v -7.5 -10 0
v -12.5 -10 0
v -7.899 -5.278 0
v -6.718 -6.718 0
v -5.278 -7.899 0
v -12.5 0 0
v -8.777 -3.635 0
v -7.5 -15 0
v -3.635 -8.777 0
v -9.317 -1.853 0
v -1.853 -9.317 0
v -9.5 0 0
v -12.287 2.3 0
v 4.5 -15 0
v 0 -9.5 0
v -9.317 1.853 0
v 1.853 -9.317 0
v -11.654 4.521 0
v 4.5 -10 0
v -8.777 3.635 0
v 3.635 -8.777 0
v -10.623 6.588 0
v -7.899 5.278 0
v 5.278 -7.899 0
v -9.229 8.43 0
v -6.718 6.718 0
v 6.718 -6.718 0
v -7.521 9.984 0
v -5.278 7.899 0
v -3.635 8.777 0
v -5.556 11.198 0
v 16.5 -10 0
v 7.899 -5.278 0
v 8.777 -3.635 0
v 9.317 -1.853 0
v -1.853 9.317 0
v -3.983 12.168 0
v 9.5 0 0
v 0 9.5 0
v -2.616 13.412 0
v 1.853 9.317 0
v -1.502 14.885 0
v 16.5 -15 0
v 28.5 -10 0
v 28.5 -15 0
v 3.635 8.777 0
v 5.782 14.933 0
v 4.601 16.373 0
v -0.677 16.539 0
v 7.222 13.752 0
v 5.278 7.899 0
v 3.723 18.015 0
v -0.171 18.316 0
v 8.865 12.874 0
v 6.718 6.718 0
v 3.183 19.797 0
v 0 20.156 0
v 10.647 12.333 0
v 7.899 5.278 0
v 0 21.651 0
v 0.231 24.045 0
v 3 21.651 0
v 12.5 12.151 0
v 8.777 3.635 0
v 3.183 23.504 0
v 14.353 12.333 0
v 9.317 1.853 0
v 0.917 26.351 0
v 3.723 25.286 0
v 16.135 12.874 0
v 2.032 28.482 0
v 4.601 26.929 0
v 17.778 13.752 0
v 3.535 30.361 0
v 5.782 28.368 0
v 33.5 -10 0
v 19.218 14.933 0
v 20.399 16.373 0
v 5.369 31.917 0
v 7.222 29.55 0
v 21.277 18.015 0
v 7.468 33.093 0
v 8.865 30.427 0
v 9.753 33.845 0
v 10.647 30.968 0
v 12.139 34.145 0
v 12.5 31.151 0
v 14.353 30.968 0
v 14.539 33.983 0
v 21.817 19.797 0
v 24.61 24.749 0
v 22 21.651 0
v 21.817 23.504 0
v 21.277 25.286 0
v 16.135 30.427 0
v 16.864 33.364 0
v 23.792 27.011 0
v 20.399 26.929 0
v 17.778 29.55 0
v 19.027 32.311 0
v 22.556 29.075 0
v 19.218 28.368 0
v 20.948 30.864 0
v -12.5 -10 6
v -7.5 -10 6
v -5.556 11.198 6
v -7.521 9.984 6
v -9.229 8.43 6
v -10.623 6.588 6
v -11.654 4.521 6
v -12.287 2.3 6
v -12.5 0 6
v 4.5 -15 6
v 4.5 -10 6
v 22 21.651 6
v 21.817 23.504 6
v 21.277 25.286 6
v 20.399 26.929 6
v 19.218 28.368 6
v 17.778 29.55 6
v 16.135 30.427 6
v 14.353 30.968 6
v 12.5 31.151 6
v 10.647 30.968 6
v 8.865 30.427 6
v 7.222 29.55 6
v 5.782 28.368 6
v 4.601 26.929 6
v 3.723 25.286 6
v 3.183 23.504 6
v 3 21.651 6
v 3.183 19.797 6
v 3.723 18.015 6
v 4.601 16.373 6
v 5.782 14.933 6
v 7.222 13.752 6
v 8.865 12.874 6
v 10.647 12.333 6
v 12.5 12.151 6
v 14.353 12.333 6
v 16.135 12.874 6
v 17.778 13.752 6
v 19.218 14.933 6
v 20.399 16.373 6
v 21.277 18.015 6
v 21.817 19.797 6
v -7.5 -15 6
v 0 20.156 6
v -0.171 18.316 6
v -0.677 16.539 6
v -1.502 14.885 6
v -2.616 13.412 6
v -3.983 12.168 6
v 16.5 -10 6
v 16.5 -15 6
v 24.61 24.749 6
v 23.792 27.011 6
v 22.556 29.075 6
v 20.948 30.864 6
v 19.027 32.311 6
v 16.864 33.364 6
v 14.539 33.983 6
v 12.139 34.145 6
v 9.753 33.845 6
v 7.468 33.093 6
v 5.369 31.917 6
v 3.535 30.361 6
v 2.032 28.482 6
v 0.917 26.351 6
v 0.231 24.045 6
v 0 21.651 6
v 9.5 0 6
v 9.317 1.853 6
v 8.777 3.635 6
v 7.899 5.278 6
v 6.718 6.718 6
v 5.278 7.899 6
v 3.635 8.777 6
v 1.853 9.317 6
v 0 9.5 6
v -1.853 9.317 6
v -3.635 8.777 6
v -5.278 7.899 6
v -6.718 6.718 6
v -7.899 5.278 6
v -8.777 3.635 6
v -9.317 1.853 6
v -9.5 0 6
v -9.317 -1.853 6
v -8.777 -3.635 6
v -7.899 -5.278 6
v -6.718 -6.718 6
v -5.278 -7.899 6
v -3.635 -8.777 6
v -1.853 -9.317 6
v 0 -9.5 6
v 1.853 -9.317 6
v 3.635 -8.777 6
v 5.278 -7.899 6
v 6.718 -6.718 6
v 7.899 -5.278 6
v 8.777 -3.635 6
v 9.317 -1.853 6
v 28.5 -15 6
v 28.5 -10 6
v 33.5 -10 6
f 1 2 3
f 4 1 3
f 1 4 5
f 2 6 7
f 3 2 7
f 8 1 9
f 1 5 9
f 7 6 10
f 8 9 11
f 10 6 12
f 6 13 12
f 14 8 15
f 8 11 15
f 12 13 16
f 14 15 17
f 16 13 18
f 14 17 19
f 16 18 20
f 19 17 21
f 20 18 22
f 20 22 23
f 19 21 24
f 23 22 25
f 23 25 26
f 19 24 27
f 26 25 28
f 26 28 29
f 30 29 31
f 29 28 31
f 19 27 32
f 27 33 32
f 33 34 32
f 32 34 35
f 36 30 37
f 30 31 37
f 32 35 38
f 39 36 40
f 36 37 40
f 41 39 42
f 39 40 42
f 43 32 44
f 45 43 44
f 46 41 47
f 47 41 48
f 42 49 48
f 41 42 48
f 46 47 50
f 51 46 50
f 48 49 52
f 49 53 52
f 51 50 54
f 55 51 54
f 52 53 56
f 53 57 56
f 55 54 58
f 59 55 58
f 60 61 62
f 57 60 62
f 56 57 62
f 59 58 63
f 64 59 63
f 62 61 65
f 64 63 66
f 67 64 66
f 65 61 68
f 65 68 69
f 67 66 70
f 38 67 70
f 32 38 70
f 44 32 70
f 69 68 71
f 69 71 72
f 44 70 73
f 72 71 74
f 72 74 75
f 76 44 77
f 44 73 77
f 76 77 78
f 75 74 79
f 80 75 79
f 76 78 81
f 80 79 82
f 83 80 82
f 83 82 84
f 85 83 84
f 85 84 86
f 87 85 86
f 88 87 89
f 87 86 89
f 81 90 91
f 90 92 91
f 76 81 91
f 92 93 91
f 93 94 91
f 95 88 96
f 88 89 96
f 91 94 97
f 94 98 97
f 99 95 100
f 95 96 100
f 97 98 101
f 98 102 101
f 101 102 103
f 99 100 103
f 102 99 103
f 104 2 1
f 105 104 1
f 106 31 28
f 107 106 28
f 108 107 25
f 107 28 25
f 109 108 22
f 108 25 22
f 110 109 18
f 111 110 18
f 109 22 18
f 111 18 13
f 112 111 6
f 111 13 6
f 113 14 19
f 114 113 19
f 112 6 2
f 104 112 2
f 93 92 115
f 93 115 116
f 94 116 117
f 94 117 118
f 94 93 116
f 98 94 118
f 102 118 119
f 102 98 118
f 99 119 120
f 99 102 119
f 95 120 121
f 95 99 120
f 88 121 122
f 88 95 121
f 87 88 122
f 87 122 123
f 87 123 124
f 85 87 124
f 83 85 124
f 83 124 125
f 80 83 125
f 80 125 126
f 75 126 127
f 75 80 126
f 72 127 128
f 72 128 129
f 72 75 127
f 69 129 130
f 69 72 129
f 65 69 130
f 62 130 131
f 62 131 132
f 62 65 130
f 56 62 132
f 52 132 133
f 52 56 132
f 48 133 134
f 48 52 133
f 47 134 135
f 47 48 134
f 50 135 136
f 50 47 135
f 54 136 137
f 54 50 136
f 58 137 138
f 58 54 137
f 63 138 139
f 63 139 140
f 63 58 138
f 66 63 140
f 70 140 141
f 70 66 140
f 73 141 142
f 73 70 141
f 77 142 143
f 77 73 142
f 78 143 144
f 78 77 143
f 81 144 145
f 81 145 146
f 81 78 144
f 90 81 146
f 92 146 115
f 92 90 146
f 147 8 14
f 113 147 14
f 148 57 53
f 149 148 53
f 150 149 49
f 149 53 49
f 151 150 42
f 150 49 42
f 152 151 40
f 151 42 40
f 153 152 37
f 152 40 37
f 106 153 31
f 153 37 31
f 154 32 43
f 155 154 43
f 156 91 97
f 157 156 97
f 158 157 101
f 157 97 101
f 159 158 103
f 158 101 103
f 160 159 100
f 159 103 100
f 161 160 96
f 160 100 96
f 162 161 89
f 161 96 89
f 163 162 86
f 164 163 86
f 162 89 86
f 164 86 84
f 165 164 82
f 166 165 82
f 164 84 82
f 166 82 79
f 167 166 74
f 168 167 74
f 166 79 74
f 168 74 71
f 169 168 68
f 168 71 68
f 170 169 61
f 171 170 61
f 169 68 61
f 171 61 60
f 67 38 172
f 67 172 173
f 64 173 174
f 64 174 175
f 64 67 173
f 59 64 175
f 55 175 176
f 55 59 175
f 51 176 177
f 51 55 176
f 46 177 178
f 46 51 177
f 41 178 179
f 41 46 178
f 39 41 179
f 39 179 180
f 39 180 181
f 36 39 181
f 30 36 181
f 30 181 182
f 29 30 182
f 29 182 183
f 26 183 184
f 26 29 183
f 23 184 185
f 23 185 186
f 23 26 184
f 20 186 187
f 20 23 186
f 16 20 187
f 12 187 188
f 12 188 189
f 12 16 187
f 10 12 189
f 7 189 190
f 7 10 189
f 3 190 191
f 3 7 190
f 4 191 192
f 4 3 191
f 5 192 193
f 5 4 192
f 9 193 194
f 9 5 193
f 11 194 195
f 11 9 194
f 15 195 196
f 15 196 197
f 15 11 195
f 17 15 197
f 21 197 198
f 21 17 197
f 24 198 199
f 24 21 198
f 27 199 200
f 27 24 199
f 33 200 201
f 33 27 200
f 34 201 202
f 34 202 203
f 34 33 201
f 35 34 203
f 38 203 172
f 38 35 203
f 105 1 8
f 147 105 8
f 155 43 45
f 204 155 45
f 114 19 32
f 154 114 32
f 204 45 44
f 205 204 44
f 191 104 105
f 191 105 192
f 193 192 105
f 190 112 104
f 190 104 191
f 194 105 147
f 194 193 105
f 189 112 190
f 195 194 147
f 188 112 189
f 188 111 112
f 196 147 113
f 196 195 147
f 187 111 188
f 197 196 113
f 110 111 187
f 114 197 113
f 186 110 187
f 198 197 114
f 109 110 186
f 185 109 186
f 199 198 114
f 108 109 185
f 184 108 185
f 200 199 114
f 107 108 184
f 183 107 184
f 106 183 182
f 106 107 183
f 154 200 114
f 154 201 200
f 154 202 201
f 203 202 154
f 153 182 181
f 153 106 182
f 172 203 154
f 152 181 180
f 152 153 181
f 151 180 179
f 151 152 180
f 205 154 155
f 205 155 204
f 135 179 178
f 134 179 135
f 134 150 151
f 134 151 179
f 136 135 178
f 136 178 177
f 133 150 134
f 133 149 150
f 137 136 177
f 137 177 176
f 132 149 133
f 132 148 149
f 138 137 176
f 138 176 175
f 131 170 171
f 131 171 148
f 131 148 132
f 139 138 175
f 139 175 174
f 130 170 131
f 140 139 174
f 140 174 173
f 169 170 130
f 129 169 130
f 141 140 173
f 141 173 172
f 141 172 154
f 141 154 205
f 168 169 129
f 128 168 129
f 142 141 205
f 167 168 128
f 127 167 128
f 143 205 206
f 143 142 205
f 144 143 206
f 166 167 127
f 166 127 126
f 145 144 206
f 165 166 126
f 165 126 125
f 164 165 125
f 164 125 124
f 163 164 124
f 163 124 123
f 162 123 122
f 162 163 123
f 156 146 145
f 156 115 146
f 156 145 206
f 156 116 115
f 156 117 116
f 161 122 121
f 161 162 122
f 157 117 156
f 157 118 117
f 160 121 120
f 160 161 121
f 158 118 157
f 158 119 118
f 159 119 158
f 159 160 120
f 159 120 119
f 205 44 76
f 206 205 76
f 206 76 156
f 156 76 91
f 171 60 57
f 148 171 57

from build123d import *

# Parameters (mm, degrees)
CROQUIS1_R              = 9.5
SALIENTE_EXTRUIR1_DEPTH = 6


with BuildPart() as part:
    # Croquis1 → Saliente-Extruir1 (new body)
    with BuildSketch(Plane.XY):
        with BuildLine():
            Line((-12.5, 0), (-12.5, -10))
            Line((-12.5, -10), (-7.5, -10))
            Line((-7.5, -10), (-7.5, -15))
            Line((-7.5, -15), (4.5, -15))
            Line((4.5, -15), (4.5, -10))
            Line((4.5, -10), (16.5, -10))
            Line((16.5, -10), (16.5, -15))
            Line((16.5, -15), (28.5, -15))
            Line((28.5, -15), (28.5, -10))
            Line((28.5, -10), (33.5, -10))
            Line((33.5, -10), (24.60996669, 24.748813068))
            ThreePointArc((24.60996669, 24.748813068), (10.938683829, 34.052743456), (0, 21.650635095))
            Line((0, 21.650635095), (0, 20.155644371))
            ThreePointArc((0, 20.155644371), (-1.501634144, 14.885181604), (-5.555555556, 11.197580206))
            ThreePointArc((-5.555555556, 11.197580206), (-10.62295732, 6.588078459), (-12.5, 0))
        make_face()
        Circle(CROQUIS1_R, mode=Mode.SUBTRACT)
        with Locations((12.5, 21.650635095)):
            Circle(CROQUIS1_R, mode=Mode.SUBTRACT)
    extrude(amount=SALIENTE_EXTRUIR1_DEPTH)


solid = part.part
